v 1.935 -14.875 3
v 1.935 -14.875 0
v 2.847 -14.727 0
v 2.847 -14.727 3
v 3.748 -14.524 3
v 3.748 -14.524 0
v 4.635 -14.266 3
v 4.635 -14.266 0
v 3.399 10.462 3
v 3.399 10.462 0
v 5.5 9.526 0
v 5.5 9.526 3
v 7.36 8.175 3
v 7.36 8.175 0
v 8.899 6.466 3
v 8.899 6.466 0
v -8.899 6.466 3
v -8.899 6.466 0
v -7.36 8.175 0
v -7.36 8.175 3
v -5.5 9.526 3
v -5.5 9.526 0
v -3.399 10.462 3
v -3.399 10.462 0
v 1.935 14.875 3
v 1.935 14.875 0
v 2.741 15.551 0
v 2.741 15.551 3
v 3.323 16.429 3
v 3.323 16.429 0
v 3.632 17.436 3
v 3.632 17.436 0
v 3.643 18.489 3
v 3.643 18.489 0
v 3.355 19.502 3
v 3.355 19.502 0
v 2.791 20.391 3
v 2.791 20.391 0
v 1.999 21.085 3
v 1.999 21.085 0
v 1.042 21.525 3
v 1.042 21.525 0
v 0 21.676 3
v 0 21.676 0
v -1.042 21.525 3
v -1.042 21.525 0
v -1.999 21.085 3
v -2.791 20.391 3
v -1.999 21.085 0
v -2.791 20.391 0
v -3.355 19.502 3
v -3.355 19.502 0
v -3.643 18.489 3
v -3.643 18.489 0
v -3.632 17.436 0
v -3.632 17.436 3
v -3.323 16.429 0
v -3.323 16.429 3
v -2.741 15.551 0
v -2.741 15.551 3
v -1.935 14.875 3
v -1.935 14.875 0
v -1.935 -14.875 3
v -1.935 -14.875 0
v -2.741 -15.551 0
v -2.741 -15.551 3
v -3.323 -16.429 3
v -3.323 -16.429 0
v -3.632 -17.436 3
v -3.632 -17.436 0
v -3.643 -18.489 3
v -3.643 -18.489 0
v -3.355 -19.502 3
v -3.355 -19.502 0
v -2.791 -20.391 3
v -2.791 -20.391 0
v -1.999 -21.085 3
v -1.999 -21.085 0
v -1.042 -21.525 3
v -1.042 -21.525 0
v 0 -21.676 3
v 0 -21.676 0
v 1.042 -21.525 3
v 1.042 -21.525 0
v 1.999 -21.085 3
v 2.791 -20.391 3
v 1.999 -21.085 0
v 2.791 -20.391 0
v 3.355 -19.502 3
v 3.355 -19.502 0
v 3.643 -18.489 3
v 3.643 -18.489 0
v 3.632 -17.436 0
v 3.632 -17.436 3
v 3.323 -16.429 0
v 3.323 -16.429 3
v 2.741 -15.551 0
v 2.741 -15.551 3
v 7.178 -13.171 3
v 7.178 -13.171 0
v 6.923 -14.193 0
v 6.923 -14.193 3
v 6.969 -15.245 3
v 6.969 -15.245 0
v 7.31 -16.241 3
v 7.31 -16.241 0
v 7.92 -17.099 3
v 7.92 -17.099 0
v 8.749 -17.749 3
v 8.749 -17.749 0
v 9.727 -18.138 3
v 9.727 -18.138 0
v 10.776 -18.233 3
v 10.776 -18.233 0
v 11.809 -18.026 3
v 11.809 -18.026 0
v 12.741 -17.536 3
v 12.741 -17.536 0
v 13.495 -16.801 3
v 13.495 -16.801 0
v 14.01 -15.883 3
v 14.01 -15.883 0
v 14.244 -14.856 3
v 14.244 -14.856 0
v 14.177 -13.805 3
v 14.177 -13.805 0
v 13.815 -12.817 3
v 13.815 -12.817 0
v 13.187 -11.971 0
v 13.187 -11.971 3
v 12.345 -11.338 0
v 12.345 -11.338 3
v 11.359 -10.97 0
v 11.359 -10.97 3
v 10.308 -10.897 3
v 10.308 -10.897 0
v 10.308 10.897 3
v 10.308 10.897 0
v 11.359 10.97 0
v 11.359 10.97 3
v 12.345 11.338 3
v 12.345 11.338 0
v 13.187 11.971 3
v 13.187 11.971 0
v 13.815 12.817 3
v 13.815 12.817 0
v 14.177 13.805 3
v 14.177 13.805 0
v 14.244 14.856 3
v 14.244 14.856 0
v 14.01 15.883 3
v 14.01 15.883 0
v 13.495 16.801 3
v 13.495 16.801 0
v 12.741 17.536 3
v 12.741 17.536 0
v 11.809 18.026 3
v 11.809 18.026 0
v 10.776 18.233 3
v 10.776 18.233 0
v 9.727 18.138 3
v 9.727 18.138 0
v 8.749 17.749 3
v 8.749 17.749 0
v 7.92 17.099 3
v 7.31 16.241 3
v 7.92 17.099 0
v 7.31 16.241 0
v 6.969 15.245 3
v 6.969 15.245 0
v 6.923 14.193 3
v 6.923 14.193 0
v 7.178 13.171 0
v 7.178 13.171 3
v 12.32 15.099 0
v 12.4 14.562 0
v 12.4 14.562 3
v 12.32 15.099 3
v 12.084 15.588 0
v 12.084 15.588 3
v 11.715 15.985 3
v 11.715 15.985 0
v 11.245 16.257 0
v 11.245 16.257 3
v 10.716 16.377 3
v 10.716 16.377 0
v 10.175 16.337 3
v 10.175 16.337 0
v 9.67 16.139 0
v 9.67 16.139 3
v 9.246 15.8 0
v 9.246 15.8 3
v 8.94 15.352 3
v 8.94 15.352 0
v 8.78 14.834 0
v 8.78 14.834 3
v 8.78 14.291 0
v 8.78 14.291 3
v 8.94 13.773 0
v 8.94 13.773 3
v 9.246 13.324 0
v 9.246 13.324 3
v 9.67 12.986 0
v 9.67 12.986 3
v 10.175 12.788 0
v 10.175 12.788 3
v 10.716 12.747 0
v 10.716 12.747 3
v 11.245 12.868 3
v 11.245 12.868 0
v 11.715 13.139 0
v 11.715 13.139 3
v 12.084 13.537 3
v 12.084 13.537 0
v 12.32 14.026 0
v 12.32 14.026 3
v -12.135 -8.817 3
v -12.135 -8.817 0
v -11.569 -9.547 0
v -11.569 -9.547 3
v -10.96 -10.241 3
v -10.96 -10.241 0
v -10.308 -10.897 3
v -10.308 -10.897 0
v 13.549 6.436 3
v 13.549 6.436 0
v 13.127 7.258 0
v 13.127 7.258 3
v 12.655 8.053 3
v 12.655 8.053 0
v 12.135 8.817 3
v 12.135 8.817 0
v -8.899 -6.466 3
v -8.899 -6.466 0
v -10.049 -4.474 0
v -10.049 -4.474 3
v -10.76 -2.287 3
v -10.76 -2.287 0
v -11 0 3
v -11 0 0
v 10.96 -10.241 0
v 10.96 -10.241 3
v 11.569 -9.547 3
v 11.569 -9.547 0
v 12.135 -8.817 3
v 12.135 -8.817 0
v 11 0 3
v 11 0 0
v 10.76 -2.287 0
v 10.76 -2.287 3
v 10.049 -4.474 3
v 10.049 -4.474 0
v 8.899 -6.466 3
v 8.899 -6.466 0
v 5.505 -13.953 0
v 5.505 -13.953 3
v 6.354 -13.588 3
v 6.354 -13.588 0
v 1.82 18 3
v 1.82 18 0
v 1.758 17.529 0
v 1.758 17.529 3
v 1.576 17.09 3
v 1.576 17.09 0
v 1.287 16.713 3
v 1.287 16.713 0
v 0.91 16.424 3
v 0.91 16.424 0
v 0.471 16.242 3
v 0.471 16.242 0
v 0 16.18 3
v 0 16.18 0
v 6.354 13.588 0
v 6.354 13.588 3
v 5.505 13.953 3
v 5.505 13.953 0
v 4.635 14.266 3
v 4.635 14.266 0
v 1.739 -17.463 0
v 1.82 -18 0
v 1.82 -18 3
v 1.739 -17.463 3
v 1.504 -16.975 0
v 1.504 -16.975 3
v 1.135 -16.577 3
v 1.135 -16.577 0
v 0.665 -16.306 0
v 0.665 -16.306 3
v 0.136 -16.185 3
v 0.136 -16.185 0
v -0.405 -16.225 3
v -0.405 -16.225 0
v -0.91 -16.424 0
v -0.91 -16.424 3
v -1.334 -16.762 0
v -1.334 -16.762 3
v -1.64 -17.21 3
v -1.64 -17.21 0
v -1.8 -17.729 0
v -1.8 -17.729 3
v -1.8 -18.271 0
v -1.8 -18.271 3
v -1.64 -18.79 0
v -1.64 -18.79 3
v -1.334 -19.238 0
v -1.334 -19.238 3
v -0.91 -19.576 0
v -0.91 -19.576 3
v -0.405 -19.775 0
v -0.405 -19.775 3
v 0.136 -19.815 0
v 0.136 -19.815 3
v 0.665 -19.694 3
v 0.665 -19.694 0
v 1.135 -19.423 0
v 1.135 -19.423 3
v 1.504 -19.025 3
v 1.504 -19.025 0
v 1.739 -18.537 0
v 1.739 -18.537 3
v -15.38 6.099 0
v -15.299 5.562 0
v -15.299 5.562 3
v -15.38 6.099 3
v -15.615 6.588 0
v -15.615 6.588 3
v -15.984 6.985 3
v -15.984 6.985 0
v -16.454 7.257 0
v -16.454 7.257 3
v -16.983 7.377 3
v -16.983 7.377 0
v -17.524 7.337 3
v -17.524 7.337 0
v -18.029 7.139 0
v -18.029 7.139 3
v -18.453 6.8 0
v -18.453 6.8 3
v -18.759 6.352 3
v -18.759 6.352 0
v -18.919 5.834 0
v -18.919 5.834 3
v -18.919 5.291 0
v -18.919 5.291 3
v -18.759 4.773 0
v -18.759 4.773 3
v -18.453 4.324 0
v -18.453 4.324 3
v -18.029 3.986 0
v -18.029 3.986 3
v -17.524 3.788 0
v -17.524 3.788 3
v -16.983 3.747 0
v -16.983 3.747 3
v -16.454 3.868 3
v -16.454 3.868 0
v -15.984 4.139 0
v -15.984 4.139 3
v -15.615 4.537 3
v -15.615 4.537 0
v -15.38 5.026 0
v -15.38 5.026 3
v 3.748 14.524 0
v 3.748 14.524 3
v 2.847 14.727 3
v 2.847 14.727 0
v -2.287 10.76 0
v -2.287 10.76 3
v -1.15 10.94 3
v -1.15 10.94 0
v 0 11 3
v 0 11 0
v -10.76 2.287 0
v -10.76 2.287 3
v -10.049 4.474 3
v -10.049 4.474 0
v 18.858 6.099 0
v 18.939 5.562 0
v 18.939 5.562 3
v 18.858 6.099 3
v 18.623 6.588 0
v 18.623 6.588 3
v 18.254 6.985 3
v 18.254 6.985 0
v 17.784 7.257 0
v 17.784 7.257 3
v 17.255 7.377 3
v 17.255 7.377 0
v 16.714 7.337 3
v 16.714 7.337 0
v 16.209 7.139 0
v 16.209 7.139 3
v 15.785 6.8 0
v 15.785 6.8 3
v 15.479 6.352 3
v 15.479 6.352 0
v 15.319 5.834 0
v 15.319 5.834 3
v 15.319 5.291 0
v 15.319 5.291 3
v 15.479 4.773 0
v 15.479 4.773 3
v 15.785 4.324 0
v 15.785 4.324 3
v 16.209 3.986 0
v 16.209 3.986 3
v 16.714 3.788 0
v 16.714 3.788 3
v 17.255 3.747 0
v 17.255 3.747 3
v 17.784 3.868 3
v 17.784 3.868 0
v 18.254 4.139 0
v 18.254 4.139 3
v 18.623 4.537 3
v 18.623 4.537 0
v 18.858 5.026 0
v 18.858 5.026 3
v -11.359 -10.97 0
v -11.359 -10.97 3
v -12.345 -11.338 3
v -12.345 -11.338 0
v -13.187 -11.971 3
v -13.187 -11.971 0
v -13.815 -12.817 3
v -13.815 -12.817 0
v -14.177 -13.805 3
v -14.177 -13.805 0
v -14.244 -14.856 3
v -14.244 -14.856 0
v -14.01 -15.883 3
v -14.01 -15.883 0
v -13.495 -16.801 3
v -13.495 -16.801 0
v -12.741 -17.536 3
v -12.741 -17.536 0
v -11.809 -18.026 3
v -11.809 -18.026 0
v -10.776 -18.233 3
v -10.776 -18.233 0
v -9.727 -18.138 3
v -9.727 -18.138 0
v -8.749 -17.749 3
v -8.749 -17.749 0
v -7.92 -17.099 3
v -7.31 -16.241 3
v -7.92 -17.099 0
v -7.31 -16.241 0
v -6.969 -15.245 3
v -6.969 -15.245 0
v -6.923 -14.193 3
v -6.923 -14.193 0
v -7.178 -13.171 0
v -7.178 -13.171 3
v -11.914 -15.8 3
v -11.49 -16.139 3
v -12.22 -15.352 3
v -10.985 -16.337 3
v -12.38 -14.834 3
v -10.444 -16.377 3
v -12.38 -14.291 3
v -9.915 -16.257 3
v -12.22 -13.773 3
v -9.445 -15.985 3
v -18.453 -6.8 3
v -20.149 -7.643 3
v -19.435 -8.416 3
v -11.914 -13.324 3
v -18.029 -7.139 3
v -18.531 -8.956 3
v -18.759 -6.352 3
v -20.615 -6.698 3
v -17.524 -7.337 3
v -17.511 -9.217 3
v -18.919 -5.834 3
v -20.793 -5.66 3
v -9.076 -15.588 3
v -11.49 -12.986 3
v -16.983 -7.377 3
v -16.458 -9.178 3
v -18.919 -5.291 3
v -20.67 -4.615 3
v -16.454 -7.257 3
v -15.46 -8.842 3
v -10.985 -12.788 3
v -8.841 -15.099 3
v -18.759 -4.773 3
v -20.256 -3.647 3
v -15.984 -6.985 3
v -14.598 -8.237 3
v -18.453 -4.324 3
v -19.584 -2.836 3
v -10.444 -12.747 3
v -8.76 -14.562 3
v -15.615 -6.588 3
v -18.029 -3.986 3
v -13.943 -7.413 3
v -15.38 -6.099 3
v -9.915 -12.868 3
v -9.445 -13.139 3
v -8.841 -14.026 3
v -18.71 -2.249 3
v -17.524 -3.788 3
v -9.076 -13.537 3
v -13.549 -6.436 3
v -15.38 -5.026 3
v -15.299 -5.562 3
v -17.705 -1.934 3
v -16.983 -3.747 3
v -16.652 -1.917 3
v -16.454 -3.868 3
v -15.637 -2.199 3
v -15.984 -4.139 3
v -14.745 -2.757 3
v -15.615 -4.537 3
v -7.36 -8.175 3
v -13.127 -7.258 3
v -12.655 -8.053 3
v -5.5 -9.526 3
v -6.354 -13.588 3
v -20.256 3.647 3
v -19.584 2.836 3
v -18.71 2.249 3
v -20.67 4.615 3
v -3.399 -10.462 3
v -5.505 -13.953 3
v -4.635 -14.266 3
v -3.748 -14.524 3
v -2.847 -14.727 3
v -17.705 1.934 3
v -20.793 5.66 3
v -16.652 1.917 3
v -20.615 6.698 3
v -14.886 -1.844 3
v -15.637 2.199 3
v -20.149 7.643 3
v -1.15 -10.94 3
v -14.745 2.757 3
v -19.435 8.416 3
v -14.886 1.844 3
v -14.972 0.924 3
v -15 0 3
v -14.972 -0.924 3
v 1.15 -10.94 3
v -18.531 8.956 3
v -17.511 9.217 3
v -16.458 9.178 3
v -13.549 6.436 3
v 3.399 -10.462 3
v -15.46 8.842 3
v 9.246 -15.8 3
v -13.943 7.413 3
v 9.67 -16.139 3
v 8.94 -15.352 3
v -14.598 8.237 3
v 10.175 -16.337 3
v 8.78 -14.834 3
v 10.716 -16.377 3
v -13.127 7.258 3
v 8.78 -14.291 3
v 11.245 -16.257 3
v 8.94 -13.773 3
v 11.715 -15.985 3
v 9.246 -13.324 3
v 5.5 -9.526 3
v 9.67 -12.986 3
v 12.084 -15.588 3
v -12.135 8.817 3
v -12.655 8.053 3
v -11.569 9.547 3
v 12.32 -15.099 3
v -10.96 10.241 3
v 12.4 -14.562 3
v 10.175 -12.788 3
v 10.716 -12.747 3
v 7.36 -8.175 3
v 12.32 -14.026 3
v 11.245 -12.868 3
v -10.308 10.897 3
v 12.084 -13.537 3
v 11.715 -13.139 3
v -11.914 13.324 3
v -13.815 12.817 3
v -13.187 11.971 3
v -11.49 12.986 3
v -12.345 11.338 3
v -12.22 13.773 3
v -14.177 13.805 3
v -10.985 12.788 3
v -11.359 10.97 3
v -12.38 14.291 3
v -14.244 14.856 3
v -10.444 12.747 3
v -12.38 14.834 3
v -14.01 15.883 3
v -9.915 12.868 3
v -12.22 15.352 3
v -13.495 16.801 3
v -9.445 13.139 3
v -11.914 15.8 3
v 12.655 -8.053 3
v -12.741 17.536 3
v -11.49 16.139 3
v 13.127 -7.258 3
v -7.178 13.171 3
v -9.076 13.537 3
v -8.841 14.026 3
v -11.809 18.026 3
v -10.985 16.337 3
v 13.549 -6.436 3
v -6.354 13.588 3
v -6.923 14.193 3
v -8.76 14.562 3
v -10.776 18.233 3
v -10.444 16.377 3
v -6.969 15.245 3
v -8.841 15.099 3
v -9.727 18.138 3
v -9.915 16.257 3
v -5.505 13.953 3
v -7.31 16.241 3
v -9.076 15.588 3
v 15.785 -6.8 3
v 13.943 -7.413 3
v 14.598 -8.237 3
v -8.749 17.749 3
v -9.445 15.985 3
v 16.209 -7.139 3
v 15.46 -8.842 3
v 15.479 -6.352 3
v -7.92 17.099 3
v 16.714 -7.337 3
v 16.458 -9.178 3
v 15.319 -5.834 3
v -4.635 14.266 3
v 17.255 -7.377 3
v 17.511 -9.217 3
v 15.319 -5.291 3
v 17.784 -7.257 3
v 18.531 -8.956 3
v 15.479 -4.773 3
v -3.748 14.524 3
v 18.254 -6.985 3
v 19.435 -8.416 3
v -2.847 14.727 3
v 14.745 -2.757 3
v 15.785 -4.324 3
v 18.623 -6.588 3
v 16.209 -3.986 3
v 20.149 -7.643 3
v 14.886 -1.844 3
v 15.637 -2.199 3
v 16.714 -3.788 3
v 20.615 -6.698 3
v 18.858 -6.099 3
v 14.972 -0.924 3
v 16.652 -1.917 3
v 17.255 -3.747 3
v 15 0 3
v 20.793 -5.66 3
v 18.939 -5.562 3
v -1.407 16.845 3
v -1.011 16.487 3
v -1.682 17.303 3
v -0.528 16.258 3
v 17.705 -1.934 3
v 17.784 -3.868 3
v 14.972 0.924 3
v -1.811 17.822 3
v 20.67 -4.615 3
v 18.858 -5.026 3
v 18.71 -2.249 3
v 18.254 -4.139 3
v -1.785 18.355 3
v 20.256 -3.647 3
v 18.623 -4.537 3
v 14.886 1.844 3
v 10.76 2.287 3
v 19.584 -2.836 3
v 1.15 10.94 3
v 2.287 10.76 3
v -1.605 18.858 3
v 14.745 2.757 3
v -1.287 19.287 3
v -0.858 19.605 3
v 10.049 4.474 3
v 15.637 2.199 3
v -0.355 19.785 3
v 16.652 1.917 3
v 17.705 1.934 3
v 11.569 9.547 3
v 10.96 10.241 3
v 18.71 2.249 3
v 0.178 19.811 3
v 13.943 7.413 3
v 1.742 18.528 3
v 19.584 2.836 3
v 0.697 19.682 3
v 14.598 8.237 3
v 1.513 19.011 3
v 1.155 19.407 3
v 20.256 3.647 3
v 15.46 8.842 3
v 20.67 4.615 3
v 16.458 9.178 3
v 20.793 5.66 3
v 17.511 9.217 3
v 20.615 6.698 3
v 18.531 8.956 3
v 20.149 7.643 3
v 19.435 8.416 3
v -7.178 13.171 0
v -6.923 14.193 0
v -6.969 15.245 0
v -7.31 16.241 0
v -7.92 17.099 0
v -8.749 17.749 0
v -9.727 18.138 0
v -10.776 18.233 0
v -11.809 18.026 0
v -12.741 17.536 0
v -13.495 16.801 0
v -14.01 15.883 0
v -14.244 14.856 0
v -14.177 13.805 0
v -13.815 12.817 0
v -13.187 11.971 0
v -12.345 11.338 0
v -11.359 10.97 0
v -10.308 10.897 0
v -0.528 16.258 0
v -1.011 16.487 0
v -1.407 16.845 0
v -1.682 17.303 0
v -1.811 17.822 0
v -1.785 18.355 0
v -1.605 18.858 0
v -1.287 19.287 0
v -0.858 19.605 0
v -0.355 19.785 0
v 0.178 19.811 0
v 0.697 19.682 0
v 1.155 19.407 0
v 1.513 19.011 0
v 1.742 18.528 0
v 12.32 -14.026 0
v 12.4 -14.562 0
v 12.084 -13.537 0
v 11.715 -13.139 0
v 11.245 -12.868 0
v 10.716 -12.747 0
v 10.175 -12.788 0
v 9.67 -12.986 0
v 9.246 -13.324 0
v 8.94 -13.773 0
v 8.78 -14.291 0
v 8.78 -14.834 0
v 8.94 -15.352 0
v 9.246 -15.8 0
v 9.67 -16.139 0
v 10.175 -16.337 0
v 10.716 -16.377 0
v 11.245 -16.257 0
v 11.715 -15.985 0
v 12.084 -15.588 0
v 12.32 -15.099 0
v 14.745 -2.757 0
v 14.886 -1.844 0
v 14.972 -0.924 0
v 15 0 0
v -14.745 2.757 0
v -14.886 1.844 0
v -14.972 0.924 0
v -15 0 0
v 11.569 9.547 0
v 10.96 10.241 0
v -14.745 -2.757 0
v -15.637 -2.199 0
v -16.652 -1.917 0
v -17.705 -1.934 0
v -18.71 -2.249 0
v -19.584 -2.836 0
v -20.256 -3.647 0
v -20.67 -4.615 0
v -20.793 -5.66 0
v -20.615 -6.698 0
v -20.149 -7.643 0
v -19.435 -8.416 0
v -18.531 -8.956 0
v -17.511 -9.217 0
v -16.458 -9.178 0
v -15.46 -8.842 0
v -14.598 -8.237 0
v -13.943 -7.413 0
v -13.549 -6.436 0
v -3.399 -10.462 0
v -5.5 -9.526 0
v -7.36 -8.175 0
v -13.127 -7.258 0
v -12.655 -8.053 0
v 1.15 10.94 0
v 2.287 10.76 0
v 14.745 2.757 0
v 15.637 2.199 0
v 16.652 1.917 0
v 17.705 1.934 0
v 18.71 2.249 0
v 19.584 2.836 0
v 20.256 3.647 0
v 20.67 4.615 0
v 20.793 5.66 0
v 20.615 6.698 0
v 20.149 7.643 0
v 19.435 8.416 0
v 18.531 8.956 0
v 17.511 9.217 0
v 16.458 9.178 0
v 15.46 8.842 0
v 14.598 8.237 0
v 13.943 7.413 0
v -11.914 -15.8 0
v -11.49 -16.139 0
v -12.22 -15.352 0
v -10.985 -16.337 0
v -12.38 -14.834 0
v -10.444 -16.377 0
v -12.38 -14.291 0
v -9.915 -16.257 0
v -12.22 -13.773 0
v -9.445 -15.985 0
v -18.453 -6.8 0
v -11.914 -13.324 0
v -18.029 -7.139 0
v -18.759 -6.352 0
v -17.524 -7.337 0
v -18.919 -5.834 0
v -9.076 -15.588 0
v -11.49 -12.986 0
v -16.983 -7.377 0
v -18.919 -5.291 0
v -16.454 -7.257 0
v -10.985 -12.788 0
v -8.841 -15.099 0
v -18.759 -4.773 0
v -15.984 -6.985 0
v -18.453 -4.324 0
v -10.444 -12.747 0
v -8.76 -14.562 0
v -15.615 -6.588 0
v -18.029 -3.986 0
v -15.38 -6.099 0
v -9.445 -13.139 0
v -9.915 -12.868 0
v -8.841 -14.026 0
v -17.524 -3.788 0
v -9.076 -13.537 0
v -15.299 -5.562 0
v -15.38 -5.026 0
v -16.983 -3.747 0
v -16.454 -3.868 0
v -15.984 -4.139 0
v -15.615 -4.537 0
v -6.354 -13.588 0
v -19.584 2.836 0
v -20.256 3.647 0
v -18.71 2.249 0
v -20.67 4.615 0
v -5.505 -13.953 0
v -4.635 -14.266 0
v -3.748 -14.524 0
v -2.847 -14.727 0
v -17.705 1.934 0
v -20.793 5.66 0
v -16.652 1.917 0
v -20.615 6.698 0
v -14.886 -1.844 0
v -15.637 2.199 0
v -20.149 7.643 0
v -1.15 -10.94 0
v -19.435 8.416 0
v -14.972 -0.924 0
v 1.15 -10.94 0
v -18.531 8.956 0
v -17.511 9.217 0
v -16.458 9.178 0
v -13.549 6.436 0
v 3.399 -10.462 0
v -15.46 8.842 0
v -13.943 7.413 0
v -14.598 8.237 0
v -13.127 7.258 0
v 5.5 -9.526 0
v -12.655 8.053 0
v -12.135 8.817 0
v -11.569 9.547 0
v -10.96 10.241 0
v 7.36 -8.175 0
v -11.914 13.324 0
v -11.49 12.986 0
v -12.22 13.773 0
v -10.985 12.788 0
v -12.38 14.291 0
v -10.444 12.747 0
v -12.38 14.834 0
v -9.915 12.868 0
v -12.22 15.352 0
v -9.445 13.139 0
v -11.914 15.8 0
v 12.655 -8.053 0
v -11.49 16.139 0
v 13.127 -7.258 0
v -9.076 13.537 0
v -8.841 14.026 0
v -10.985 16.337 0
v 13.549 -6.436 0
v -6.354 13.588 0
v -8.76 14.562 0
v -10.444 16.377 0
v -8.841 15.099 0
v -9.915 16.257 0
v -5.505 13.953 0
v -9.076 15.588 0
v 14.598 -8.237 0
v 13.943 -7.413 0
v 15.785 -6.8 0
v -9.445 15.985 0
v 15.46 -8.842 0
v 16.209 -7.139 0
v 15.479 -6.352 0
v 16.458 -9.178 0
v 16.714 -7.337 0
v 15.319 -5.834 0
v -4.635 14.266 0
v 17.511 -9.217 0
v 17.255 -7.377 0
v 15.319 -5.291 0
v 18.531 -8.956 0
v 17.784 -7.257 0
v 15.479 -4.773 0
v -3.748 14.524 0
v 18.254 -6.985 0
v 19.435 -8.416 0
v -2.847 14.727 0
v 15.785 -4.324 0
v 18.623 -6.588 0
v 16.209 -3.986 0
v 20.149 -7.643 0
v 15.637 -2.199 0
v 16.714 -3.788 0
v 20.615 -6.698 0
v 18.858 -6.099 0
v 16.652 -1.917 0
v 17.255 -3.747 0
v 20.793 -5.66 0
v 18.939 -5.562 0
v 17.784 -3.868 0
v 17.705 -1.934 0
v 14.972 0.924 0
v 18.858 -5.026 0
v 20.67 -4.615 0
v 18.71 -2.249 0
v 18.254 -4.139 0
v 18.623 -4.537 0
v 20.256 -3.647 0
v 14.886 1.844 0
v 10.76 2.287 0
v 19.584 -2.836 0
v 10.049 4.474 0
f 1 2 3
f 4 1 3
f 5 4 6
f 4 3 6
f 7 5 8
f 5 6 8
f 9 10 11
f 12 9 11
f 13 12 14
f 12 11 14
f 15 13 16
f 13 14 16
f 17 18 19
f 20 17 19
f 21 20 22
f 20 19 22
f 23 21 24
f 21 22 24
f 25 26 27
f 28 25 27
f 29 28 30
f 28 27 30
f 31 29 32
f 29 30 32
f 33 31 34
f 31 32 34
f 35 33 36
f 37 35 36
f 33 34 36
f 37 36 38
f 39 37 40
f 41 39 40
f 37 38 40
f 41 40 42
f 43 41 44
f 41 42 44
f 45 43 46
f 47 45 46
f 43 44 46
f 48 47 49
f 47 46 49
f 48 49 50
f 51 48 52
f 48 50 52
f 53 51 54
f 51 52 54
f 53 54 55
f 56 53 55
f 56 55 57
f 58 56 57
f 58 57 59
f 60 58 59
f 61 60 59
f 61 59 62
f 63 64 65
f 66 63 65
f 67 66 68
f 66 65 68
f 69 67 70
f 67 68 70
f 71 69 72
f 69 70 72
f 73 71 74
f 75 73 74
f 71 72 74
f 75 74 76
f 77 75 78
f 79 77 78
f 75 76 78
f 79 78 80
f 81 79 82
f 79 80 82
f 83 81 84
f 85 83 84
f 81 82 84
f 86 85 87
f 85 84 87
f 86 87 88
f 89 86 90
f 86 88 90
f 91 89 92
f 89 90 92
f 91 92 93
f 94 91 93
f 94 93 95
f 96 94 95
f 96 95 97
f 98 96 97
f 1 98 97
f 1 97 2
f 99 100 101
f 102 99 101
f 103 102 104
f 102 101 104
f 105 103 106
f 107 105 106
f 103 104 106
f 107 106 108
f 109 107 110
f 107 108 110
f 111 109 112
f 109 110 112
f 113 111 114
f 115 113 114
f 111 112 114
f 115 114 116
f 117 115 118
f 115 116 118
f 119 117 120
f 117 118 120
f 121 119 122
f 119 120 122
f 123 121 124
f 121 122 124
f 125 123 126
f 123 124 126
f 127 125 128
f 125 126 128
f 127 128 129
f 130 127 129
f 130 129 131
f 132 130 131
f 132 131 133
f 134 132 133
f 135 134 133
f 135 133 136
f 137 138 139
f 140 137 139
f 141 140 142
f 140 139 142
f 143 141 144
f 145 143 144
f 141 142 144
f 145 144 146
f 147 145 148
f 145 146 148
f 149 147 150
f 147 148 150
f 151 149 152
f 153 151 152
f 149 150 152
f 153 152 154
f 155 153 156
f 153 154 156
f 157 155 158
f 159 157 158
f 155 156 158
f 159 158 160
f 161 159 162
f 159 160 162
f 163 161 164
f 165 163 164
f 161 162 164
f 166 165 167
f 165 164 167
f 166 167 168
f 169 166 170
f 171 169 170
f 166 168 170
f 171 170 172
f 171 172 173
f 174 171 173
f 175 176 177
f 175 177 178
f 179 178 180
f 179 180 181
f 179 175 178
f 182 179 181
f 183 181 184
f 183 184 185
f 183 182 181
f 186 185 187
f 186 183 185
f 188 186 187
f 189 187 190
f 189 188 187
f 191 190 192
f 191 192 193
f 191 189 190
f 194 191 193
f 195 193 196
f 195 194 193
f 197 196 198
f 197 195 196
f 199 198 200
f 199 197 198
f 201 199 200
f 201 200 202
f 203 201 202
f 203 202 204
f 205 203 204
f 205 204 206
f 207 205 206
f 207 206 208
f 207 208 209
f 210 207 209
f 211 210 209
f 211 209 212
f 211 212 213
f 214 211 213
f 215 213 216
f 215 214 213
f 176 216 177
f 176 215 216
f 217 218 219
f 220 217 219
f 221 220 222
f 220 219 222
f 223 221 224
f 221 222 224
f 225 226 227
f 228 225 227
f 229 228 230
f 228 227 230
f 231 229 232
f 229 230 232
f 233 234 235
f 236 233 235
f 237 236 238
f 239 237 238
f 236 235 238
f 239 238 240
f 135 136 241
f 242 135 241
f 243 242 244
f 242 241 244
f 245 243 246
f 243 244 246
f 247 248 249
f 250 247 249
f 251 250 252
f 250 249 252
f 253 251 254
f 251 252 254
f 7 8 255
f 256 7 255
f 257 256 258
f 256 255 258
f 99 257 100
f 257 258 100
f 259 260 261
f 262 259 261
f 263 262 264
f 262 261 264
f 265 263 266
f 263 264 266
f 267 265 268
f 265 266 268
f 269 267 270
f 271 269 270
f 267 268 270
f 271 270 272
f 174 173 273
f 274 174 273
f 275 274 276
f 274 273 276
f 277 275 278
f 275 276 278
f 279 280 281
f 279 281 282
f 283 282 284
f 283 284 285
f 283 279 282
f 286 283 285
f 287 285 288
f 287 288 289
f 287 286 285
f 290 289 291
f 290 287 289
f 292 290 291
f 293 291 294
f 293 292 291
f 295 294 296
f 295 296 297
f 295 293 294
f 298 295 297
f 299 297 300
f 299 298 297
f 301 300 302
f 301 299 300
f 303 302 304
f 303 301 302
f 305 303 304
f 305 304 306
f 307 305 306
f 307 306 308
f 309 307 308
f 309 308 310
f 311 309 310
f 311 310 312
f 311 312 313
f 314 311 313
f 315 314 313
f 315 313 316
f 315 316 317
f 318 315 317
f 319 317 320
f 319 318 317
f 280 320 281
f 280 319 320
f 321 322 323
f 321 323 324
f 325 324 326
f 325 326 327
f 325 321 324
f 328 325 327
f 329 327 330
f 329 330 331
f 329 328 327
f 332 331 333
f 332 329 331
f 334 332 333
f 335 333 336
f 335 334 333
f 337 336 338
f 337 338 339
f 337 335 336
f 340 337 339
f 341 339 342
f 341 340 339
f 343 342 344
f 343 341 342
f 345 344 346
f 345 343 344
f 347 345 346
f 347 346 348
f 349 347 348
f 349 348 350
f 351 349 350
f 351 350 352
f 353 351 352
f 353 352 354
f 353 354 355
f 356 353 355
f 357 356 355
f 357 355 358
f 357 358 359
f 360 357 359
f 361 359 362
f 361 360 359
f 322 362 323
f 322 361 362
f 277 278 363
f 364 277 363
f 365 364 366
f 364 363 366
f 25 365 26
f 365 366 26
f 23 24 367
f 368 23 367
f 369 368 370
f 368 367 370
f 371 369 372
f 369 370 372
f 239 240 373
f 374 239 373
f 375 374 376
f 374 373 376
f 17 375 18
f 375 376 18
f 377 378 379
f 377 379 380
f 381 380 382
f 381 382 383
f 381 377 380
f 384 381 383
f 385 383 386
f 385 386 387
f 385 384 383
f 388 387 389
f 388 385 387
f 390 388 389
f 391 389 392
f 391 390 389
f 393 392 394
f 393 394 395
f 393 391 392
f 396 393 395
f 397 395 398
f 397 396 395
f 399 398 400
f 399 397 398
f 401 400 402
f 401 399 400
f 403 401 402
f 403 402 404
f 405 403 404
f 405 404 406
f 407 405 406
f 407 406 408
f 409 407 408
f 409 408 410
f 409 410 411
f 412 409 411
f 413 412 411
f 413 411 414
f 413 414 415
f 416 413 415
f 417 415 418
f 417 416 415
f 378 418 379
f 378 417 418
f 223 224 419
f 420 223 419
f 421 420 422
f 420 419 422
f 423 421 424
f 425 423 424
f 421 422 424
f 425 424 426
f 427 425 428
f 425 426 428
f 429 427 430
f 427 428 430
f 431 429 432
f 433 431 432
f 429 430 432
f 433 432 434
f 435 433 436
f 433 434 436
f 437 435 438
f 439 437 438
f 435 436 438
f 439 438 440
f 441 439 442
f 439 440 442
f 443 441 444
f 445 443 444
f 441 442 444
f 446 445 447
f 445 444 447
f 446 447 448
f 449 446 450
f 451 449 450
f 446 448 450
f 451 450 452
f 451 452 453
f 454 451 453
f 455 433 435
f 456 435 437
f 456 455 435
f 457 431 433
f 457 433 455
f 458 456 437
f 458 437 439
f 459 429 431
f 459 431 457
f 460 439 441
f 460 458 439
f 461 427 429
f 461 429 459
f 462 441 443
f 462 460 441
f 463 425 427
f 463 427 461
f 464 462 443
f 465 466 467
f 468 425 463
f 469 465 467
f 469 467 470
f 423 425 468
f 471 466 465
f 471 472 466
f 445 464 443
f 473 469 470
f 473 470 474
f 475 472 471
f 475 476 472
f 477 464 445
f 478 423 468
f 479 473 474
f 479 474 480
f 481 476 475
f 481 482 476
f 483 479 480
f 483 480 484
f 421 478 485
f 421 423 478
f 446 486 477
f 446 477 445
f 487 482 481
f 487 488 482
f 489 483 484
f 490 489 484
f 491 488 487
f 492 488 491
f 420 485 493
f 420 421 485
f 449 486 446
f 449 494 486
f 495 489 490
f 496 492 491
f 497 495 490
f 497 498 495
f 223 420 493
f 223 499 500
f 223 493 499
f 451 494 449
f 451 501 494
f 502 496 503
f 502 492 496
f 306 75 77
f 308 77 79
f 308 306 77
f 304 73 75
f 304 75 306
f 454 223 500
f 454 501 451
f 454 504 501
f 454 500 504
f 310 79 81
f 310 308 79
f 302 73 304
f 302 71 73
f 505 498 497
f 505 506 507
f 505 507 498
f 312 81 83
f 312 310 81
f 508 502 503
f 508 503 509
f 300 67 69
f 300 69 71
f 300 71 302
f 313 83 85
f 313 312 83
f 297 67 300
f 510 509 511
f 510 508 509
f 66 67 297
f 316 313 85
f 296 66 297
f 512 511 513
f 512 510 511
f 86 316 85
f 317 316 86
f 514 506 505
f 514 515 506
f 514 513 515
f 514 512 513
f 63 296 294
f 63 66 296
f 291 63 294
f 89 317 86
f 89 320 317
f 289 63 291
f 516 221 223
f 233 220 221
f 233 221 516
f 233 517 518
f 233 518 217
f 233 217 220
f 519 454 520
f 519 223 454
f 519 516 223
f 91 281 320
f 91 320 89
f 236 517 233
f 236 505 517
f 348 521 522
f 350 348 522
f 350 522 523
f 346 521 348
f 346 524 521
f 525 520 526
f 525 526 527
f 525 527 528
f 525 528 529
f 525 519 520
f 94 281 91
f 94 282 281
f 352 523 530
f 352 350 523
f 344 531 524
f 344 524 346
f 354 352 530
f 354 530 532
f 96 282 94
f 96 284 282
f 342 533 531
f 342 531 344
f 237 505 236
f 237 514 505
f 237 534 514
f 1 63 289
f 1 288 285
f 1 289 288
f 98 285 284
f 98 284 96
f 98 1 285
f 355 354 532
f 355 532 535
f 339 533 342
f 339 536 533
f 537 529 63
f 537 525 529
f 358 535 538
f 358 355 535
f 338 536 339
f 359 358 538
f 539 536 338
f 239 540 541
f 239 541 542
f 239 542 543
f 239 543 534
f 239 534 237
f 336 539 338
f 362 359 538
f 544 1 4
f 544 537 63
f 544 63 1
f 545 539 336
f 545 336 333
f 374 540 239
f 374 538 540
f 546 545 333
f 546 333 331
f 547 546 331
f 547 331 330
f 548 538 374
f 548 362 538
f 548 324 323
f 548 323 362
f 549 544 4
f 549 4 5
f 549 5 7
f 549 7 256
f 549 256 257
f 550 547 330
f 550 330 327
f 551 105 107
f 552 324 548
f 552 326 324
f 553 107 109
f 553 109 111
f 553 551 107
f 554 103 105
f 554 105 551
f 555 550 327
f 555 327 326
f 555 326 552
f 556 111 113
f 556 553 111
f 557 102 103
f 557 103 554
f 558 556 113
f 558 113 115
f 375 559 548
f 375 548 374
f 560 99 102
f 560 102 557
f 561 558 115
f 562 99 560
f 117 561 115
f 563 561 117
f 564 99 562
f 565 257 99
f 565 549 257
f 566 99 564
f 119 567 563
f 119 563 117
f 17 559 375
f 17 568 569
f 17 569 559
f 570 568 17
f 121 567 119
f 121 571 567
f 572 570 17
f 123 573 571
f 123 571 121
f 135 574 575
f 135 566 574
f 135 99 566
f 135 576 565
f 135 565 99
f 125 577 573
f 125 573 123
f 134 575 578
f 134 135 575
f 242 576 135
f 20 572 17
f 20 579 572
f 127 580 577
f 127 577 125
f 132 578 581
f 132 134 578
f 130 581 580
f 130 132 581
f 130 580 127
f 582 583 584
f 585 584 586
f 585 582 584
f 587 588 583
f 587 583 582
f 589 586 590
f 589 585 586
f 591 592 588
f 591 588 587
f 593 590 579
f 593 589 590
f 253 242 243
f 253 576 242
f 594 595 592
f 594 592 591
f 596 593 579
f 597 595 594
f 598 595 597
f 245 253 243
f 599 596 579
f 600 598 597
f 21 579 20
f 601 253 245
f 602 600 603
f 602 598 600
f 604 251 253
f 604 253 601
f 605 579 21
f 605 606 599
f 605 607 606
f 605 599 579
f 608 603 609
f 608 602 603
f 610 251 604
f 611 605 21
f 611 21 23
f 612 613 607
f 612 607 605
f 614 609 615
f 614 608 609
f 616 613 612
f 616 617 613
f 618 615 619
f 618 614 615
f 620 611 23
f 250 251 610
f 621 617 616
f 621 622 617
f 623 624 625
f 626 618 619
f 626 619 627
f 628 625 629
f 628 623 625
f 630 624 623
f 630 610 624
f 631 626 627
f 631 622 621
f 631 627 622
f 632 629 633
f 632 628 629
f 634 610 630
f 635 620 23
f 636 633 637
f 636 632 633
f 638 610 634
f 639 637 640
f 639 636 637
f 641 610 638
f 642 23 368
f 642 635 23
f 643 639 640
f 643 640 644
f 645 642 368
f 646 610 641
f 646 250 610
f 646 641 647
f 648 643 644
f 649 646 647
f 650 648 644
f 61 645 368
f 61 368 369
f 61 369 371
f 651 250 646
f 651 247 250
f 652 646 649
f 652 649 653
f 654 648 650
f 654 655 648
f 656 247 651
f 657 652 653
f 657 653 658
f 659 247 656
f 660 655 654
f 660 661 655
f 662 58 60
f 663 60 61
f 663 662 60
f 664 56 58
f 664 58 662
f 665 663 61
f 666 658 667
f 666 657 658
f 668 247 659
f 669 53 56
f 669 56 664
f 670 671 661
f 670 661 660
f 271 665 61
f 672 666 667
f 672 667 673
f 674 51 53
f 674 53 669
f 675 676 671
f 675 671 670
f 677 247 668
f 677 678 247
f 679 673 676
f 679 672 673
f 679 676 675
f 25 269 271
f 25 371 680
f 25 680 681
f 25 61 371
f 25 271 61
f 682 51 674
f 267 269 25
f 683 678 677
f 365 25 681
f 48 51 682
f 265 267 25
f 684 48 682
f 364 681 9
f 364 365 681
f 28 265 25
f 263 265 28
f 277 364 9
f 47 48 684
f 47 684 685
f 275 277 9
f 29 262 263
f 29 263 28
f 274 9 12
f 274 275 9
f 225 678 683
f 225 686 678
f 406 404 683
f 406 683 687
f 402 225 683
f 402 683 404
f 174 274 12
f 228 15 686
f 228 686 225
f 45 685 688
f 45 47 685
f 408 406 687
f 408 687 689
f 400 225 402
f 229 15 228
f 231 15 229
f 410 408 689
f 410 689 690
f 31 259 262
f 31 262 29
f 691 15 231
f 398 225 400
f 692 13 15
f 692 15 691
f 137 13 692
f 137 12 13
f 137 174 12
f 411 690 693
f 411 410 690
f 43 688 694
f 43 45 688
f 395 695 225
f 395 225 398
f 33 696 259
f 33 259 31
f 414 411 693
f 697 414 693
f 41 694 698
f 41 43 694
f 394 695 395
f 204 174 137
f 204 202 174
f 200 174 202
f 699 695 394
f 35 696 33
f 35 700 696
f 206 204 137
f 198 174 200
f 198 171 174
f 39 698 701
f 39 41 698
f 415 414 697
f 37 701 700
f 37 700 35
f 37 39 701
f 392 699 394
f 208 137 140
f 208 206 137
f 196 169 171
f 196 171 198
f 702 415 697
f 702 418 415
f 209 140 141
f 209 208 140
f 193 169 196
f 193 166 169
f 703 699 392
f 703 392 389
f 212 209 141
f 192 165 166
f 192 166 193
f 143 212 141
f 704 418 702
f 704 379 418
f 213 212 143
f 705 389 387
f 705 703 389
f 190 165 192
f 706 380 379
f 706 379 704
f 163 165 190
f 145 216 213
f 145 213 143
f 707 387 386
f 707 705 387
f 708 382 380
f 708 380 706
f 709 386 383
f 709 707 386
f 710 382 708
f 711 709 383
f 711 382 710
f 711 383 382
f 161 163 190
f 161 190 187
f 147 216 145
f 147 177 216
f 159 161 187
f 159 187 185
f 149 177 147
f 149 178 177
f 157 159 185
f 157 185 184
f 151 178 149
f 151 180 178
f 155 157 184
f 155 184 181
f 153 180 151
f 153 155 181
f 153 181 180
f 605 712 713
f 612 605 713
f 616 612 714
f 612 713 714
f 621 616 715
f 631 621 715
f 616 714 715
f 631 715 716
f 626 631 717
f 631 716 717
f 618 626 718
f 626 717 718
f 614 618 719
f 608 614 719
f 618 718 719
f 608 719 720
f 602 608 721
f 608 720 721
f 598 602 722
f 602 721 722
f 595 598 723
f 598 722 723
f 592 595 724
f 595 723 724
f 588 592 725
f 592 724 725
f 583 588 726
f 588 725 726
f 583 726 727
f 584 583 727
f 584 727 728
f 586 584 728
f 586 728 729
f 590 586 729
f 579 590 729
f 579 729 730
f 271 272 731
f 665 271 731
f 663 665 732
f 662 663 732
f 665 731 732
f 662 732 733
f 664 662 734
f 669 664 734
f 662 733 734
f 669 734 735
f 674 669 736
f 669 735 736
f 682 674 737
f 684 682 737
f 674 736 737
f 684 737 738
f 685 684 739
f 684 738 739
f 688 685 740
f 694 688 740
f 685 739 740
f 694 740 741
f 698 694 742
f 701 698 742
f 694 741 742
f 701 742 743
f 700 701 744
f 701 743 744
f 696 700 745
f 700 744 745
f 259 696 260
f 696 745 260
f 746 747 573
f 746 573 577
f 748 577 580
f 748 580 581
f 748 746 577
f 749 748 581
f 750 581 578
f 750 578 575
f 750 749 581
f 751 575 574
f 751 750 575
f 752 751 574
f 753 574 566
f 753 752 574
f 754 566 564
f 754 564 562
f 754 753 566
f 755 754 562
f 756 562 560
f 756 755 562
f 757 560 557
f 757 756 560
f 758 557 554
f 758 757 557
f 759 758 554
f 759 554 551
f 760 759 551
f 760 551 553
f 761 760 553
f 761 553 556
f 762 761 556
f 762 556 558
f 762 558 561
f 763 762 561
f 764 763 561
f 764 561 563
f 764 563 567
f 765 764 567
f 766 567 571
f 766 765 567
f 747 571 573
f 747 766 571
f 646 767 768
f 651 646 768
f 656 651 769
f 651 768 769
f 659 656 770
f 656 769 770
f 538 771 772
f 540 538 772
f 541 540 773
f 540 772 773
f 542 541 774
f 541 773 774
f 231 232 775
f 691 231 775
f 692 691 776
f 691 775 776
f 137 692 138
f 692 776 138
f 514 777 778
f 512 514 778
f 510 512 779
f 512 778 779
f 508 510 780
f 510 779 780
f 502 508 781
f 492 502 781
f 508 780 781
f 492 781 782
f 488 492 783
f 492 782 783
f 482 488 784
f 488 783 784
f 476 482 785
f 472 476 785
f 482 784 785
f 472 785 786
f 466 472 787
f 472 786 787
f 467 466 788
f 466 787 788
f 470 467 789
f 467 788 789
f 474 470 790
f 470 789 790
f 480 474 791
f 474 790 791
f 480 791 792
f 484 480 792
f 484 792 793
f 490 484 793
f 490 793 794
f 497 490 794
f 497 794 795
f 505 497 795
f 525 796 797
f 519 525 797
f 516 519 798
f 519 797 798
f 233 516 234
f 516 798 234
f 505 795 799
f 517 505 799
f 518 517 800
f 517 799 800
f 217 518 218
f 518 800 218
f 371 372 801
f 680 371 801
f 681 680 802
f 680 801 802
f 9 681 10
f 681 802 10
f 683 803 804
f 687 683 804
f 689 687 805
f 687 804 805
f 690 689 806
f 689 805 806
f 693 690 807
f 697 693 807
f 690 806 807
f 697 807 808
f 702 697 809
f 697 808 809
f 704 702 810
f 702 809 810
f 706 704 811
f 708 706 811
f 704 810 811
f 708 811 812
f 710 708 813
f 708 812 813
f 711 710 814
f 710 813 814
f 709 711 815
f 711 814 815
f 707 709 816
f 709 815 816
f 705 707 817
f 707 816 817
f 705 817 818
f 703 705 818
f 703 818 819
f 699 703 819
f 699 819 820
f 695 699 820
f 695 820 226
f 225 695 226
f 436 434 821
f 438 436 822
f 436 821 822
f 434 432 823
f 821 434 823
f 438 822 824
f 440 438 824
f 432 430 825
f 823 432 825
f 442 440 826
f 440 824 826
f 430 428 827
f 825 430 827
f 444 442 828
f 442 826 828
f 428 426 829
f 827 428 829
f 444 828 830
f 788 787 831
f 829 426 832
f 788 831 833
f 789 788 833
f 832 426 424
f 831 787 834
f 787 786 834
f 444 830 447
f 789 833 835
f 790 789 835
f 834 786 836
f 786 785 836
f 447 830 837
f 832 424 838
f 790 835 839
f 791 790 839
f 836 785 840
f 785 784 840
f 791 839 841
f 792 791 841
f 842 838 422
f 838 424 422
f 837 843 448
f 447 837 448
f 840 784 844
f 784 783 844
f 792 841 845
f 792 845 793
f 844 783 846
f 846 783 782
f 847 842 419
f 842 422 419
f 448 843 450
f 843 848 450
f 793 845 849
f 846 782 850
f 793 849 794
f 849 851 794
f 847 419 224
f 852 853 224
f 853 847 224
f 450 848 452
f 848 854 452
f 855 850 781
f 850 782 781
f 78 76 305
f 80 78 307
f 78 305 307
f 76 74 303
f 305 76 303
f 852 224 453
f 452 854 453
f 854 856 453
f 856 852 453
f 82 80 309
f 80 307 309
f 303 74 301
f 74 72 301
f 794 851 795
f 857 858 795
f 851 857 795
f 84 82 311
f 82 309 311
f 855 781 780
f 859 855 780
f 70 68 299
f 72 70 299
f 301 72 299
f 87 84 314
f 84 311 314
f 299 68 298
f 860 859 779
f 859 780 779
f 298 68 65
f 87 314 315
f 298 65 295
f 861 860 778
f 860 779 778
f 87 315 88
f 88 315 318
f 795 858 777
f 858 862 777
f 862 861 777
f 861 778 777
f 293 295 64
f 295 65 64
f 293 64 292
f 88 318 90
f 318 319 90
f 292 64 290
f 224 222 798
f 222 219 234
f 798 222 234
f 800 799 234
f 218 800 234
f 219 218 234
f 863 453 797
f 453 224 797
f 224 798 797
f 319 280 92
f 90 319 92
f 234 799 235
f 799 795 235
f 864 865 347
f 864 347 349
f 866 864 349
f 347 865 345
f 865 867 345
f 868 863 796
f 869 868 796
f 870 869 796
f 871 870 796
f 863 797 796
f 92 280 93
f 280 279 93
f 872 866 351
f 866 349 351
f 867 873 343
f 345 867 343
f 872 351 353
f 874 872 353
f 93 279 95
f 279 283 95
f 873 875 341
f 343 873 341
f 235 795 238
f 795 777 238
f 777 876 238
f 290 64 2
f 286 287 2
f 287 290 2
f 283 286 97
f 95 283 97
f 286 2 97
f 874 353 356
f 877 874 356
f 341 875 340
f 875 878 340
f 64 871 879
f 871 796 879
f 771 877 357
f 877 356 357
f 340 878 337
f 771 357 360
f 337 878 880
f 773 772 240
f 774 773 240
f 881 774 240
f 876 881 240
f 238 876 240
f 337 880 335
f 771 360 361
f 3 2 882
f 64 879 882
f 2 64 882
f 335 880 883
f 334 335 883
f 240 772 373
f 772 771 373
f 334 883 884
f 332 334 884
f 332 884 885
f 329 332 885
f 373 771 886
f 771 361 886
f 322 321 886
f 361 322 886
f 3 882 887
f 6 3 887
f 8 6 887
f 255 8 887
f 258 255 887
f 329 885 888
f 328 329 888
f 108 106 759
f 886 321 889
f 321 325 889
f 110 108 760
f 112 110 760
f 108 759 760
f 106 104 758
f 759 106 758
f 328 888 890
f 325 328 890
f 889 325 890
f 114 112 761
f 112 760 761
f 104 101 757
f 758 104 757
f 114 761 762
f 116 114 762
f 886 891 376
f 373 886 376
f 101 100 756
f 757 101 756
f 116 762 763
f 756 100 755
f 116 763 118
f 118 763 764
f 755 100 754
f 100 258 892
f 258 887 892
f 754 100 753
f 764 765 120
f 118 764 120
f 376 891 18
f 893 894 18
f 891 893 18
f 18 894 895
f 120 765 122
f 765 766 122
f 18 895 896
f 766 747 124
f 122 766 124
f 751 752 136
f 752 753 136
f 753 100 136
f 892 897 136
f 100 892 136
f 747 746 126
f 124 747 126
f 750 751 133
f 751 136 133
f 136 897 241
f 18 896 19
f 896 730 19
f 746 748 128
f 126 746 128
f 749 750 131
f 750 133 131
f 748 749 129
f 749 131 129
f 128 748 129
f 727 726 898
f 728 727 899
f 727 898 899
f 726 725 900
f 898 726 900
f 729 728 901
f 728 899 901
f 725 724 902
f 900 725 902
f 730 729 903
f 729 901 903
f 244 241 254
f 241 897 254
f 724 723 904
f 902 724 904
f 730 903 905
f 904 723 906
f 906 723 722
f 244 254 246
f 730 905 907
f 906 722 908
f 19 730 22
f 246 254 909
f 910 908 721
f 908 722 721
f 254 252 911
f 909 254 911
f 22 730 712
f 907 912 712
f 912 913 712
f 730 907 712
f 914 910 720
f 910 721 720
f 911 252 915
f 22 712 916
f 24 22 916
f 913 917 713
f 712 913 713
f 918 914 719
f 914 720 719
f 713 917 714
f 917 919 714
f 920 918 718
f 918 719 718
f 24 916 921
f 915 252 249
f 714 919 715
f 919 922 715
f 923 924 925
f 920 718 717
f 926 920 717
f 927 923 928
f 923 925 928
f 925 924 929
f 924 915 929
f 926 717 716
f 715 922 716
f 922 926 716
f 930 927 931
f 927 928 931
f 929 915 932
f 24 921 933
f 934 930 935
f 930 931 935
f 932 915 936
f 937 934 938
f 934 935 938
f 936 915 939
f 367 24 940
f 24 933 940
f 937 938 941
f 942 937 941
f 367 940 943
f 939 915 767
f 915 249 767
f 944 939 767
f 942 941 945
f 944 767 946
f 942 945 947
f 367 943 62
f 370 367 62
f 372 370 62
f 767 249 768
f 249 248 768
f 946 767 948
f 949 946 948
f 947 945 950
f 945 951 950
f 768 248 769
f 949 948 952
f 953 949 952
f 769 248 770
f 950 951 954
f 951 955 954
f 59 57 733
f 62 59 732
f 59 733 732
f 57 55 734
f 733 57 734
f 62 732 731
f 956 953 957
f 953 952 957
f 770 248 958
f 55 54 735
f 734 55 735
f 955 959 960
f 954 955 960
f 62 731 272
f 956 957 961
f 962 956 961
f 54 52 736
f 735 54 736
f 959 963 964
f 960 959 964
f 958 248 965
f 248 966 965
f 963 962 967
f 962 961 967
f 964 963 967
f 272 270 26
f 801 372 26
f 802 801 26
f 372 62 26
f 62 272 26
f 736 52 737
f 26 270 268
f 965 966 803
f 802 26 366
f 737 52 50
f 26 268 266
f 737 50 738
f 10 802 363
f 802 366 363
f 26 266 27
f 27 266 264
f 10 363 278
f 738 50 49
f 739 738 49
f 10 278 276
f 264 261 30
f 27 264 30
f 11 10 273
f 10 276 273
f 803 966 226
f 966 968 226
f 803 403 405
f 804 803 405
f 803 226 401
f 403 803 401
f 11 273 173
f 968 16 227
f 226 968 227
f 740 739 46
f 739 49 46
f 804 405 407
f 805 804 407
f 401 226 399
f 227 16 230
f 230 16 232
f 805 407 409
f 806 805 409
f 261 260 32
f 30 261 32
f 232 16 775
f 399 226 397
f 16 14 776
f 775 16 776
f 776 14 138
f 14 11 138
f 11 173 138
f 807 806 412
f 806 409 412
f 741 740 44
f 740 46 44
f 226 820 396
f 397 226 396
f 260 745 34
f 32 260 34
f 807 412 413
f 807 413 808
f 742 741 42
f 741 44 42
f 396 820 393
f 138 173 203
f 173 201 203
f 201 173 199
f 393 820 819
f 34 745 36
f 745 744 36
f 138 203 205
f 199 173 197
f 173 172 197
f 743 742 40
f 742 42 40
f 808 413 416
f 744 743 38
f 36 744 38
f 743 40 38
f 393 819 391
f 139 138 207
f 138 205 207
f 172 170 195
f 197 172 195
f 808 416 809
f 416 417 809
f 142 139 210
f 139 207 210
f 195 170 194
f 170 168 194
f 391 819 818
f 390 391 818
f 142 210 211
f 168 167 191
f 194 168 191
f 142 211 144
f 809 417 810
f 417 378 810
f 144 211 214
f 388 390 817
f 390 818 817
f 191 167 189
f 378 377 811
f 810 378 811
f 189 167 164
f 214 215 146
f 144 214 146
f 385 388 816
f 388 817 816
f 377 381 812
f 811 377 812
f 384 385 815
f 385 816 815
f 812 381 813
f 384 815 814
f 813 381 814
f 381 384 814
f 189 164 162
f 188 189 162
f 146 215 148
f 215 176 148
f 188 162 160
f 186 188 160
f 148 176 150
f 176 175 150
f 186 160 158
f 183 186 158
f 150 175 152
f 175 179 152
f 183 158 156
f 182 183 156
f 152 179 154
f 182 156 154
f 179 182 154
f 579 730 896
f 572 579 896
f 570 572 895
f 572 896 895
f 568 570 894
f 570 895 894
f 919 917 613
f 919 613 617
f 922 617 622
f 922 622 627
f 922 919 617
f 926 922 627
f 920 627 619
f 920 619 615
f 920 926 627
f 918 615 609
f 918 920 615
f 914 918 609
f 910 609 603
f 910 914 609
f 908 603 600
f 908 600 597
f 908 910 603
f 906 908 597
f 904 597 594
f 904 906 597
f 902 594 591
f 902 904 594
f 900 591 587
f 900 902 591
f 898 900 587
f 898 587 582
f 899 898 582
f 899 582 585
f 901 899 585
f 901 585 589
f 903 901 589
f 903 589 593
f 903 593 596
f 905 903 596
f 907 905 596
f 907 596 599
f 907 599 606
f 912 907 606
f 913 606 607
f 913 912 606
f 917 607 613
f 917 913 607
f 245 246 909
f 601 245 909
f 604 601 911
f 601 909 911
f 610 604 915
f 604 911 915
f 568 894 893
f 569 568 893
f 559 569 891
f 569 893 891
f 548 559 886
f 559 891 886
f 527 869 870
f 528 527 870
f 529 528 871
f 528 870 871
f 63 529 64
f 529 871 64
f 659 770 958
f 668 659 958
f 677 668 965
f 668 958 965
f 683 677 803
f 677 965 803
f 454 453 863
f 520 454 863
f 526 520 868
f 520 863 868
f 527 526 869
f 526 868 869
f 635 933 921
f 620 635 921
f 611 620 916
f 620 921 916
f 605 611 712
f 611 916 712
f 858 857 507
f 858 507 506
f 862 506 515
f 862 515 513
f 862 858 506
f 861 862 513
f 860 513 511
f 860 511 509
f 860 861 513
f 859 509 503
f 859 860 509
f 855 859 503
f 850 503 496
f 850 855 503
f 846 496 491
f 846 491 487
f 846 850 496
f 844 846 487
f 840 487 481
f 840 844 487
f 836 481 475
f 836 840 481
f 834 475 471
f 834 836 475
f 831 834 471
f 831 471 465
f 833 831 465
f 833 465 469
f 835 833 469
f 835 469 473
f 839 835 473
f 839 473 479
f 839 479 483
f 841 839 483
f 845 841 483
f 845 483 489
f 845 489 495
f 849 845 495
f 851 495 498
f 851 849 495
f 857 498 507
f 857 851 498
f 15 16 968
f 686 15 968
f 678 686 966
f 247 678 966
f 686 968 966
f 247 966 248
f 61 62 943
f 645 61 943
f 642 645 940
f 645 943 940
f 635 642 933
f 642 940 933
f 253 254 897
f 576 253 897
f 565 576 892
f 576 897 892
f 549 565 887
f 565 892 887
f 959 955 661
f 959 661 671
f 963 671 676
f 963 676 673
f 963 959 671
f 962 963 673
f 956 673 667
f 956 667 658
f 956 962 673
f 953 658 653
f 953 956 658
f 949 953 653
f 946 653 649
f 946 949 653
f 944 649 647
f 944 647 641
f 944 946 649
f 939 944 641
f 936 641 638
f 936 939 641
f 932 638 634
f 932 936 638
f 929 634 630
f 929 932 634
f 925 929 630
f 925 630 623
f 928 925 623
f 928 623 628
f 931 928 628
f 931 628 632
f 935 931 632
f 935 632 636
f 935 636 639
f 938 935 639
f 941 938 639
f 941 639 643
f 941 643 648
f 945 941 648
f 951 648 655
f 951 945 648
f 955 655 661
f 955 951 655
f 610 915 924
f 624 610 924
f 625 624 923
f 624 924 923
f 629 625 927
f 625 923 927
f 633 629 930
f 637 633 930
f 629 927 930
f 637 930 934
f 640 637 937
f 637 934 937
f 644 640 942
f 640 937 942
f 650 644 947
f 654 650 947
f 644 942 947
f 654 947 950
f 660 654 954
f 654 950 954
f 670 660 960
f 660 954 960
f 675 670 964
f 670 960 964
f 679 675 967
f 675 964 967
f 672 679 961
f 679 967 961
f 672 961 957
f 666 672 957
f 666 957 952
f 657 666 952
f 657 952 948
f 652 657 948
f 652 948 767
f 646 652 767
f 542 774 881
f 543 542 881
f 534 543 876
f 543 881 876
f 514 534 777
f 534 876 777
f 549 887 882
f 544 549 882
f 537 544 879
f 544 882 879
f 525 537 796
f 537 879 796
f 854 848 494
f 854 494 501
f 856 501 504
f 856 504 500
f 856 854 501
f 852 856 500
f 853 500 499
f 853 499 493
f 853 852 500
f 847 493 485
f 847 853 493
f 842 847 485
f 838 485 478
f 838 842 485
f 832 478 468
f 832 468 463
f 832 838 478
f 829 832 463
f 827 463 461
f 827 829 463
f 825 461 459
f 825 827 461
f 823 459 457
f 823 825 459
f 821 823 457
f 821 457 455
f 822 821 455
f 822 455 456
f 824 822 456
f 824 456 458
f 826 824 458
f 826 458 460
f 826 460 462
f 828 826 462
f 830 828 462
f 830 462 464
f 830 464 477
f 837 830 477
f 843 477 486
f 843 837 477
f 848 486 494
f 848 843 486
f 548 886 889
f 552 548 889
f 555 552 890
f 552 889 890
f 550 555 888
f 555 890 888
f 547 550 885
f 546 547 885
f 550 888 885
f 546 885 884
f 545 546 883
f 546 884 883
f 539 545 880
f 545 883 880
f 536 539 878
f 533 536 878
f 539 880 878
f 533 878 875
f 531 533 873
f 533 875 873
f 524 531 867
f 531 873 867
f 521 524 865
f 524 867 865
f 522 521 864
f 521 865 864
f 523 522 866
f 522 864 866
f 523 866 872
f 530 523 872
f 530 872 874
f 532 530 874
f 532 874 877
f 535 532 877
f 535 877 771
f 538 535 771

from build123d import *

# Parameters (mm, degrees)
F0_R     = 1.820251
F1_DEPTH = 3


with BuildPart() as f1:
    # F0 (on Top) → F1 (new body)
    with BuildSketch(Plane.XY):
        with BuildLine():
            ThreePointArc((7.178103, 13.170985), (5.931993, 13.777208), (4.635255, 14.265848))
            ThreePointArc((4.635255, 14.265848), (3.298957, 14.632733), (1.934503, 14.874734))
            ThreePointArc((1.934503, 14.874734), (0, 21.67554), (-1.934503, 14.874734))
            ThreePointArc((-1.934503, 14.874734), (-3.298957, 14.632733), (-4.635255, 14.265848))
            ThreePointArc((-4.635255, 14.265848), (-5.931993, 13.777208), (-7.178103, 13.170985))
            ThreePointArc((-7.178103, 13.170985), (-12.740563, 17.53588), (-10.308195, 10.89684))
            ThreePointArc((-10.308195, 10.89684), (-11.269817, 9.899052), (-12.135255, 8.816779))
            ThreePointArc((-12.135255, 8.816779), (-12.897123, 7.659258), (-13.548918, 6.436367))
            ThreePointArc((-13.548918, 6.436367), (-20.614663, 6.69811), (-14.744507, 2.756724))
            ThreePointArc((-14.744507, 2.756724), (-14.93599, 1.384269), (-15, 0))
            ThreePointArc((-15, 0), (-14.93599, -1.384269), (-14.744507, -2.756724))
            ThreePointArc((-14.744507, -2.756724), (-20.614663, -6.69811), (-13.548918, -6.436367))
            ThreePointArc((-13.548918, -6.436367), (-12.897123, -7.659258), (-12.135255, -8.816779))
            ThreePointArc((-12.135255, -8.816779), (-11.269817, -9.899052), (-10.308195, -10.89684))
            ThreePointArc((-10.308195, -10.89684), (-12.740563, -17.53588), (-7.178103, -13.170985))
            ThreePointArc((-7.178103, -13.170985), (-5.931993, -13.777208), (-4.635255, -14.265848))
            ThreePointArc((-4.635255, -14.265848), (-3.298957, -14.632733), (-1.934503, -14.874734))
            ThreePointArc((-1.934503, -14.874734), (0, -21.67554), (1.934503, -14.874734))
            ThreePointArc((1.934503, -14.874734), (3.298957, -14.632733), (4.635255, -14.265848))
            ThreePointArc((4.635255, -14.265848), (5.931993, -13.777208), (7.178103, -13.170985))
            ThreePointArc((7.178103, -13.170985), (12.740563, -17.53588), (10.308195, -10.89684))
            ThreePointArc((10.308195, -10.89684), (11.269817, -9.899052), (12.135255, -8.816779))
            ThreePointArc((12.135255, -8.816779), (12.897123, -7.659258), (13.548918, -6.436367))
            ThreePointArc((13.548918, -6.436367), (20.614663, -6.69811), (14.744507, -2.756724))
            ThreePointArc((14.744507, -2.756724), (14.93599, -1.384269), (15, 0))
            ThreePointArc((15, 0), (14.93599, 1.384269), (14.744507, 2.756724))
            ThreePointArc((14.744507, 2.756724), (20.614663, 6.69811), (13.548918, 6.436367))
            ThreePointArc((13.548918, 6.436367), (12.897123, 7.659258), (12.135255, 8.816779))
            ThreePointArc((12.135255, 8.816779), (11.269817, 9.899052), (10.308195, 10.89684))
            ThreePointArc((10.308195, 10.89684), (12.740563, 17.53588), (7.178103, 13.170985))
        make_face()
        with Locations((-10.580135, -14.562306)):
            Circle(F0_R, mode=Mode.SUBTRACT)
        with Locations((-17.119017, -5.562306)):
            Circle(F0_R, mode=Mode.SUBTRACT)
        with Locations((0, -18)):
            Circle(F0_R, mode=Mode.SUBTRACT)
        with Locations((10.580135, -14.562306)):
            Circle(F0_R, mode=Mode.SUBTRACT)
        with Locations((17.119017, -5.562306)):
            Circle(F0_R, mode=Mode.SUBTRACT)
        with Locations((-17.119017, 5.562306)):
            Circle(F0_R, mode=Mode.SUBTRACT)
        with Locations((-10.580135, 14.562306)):
            Circle(F0_R, mode=Mode.SUBTRACT)
        with BuildLine():
            ThreePointArc((0, 11), (1.720779, 10.864572), (3.399187, 10.461622))
            ThreePointArc((3.399187, 10.461622), (6.465638, 8.899187), (8.899187, 6.465638))
            ThreePointArc((8.899187, 6.465638), (10.461622, 3.399187), (11, 0))
            ThreePointArc((11, 0), (10.461622, -3.399187), (8.899187, -6.465638))
            ThreePointArc((8.899187, -6.465638), (6.465638, -8.899187), (3.399187, -10.461622))
            ThreePointArc((3.399187, -10.461622), (0, -11), (-3.399187, -10.461622))
            ThreePointArc((-3.399187, -10.461622), (-6.465638, -8.899187), (-8.899187, -6.465638))
            ThreePointArc((-8.899187, -6.465638), (-10.461622, -3.399187), (-11, 0))
            ThreePointArc((-11, 0), (-10.461622, 3.399187), (-8.899187, 6.465638))
            ThreePointArc((-8.899187, 6.465638), (-6.465638, 8.899187), (-3.399187, 10.461622))
            ThreePointArc((-3.399187, 10.461622), (-1.720779, 10.864572), (0, 11))
        make_face(mode=Mode.SUBTRACT)
        with Locations((17.119017, 5.562306)):
            Circle(F0_R, mode=Mode.SUBTRACT)
        with BuildLine():
            ThreePointArc((0, 16.179749), (-1.287112, 19.287112), (1.820251, 18))
            ThreePointArc((1.820251, 18), (1.287112, 16.712888), (0, 16.179749))
        make_face(mode=Mode.SUBTRACT)
        with Locations((10.580135, 14.562306)):
            Circle(F0_R, mode=Mode.SUBTRACT)
    extrude(amount=F1_DEPTH)


solid = f1.part
